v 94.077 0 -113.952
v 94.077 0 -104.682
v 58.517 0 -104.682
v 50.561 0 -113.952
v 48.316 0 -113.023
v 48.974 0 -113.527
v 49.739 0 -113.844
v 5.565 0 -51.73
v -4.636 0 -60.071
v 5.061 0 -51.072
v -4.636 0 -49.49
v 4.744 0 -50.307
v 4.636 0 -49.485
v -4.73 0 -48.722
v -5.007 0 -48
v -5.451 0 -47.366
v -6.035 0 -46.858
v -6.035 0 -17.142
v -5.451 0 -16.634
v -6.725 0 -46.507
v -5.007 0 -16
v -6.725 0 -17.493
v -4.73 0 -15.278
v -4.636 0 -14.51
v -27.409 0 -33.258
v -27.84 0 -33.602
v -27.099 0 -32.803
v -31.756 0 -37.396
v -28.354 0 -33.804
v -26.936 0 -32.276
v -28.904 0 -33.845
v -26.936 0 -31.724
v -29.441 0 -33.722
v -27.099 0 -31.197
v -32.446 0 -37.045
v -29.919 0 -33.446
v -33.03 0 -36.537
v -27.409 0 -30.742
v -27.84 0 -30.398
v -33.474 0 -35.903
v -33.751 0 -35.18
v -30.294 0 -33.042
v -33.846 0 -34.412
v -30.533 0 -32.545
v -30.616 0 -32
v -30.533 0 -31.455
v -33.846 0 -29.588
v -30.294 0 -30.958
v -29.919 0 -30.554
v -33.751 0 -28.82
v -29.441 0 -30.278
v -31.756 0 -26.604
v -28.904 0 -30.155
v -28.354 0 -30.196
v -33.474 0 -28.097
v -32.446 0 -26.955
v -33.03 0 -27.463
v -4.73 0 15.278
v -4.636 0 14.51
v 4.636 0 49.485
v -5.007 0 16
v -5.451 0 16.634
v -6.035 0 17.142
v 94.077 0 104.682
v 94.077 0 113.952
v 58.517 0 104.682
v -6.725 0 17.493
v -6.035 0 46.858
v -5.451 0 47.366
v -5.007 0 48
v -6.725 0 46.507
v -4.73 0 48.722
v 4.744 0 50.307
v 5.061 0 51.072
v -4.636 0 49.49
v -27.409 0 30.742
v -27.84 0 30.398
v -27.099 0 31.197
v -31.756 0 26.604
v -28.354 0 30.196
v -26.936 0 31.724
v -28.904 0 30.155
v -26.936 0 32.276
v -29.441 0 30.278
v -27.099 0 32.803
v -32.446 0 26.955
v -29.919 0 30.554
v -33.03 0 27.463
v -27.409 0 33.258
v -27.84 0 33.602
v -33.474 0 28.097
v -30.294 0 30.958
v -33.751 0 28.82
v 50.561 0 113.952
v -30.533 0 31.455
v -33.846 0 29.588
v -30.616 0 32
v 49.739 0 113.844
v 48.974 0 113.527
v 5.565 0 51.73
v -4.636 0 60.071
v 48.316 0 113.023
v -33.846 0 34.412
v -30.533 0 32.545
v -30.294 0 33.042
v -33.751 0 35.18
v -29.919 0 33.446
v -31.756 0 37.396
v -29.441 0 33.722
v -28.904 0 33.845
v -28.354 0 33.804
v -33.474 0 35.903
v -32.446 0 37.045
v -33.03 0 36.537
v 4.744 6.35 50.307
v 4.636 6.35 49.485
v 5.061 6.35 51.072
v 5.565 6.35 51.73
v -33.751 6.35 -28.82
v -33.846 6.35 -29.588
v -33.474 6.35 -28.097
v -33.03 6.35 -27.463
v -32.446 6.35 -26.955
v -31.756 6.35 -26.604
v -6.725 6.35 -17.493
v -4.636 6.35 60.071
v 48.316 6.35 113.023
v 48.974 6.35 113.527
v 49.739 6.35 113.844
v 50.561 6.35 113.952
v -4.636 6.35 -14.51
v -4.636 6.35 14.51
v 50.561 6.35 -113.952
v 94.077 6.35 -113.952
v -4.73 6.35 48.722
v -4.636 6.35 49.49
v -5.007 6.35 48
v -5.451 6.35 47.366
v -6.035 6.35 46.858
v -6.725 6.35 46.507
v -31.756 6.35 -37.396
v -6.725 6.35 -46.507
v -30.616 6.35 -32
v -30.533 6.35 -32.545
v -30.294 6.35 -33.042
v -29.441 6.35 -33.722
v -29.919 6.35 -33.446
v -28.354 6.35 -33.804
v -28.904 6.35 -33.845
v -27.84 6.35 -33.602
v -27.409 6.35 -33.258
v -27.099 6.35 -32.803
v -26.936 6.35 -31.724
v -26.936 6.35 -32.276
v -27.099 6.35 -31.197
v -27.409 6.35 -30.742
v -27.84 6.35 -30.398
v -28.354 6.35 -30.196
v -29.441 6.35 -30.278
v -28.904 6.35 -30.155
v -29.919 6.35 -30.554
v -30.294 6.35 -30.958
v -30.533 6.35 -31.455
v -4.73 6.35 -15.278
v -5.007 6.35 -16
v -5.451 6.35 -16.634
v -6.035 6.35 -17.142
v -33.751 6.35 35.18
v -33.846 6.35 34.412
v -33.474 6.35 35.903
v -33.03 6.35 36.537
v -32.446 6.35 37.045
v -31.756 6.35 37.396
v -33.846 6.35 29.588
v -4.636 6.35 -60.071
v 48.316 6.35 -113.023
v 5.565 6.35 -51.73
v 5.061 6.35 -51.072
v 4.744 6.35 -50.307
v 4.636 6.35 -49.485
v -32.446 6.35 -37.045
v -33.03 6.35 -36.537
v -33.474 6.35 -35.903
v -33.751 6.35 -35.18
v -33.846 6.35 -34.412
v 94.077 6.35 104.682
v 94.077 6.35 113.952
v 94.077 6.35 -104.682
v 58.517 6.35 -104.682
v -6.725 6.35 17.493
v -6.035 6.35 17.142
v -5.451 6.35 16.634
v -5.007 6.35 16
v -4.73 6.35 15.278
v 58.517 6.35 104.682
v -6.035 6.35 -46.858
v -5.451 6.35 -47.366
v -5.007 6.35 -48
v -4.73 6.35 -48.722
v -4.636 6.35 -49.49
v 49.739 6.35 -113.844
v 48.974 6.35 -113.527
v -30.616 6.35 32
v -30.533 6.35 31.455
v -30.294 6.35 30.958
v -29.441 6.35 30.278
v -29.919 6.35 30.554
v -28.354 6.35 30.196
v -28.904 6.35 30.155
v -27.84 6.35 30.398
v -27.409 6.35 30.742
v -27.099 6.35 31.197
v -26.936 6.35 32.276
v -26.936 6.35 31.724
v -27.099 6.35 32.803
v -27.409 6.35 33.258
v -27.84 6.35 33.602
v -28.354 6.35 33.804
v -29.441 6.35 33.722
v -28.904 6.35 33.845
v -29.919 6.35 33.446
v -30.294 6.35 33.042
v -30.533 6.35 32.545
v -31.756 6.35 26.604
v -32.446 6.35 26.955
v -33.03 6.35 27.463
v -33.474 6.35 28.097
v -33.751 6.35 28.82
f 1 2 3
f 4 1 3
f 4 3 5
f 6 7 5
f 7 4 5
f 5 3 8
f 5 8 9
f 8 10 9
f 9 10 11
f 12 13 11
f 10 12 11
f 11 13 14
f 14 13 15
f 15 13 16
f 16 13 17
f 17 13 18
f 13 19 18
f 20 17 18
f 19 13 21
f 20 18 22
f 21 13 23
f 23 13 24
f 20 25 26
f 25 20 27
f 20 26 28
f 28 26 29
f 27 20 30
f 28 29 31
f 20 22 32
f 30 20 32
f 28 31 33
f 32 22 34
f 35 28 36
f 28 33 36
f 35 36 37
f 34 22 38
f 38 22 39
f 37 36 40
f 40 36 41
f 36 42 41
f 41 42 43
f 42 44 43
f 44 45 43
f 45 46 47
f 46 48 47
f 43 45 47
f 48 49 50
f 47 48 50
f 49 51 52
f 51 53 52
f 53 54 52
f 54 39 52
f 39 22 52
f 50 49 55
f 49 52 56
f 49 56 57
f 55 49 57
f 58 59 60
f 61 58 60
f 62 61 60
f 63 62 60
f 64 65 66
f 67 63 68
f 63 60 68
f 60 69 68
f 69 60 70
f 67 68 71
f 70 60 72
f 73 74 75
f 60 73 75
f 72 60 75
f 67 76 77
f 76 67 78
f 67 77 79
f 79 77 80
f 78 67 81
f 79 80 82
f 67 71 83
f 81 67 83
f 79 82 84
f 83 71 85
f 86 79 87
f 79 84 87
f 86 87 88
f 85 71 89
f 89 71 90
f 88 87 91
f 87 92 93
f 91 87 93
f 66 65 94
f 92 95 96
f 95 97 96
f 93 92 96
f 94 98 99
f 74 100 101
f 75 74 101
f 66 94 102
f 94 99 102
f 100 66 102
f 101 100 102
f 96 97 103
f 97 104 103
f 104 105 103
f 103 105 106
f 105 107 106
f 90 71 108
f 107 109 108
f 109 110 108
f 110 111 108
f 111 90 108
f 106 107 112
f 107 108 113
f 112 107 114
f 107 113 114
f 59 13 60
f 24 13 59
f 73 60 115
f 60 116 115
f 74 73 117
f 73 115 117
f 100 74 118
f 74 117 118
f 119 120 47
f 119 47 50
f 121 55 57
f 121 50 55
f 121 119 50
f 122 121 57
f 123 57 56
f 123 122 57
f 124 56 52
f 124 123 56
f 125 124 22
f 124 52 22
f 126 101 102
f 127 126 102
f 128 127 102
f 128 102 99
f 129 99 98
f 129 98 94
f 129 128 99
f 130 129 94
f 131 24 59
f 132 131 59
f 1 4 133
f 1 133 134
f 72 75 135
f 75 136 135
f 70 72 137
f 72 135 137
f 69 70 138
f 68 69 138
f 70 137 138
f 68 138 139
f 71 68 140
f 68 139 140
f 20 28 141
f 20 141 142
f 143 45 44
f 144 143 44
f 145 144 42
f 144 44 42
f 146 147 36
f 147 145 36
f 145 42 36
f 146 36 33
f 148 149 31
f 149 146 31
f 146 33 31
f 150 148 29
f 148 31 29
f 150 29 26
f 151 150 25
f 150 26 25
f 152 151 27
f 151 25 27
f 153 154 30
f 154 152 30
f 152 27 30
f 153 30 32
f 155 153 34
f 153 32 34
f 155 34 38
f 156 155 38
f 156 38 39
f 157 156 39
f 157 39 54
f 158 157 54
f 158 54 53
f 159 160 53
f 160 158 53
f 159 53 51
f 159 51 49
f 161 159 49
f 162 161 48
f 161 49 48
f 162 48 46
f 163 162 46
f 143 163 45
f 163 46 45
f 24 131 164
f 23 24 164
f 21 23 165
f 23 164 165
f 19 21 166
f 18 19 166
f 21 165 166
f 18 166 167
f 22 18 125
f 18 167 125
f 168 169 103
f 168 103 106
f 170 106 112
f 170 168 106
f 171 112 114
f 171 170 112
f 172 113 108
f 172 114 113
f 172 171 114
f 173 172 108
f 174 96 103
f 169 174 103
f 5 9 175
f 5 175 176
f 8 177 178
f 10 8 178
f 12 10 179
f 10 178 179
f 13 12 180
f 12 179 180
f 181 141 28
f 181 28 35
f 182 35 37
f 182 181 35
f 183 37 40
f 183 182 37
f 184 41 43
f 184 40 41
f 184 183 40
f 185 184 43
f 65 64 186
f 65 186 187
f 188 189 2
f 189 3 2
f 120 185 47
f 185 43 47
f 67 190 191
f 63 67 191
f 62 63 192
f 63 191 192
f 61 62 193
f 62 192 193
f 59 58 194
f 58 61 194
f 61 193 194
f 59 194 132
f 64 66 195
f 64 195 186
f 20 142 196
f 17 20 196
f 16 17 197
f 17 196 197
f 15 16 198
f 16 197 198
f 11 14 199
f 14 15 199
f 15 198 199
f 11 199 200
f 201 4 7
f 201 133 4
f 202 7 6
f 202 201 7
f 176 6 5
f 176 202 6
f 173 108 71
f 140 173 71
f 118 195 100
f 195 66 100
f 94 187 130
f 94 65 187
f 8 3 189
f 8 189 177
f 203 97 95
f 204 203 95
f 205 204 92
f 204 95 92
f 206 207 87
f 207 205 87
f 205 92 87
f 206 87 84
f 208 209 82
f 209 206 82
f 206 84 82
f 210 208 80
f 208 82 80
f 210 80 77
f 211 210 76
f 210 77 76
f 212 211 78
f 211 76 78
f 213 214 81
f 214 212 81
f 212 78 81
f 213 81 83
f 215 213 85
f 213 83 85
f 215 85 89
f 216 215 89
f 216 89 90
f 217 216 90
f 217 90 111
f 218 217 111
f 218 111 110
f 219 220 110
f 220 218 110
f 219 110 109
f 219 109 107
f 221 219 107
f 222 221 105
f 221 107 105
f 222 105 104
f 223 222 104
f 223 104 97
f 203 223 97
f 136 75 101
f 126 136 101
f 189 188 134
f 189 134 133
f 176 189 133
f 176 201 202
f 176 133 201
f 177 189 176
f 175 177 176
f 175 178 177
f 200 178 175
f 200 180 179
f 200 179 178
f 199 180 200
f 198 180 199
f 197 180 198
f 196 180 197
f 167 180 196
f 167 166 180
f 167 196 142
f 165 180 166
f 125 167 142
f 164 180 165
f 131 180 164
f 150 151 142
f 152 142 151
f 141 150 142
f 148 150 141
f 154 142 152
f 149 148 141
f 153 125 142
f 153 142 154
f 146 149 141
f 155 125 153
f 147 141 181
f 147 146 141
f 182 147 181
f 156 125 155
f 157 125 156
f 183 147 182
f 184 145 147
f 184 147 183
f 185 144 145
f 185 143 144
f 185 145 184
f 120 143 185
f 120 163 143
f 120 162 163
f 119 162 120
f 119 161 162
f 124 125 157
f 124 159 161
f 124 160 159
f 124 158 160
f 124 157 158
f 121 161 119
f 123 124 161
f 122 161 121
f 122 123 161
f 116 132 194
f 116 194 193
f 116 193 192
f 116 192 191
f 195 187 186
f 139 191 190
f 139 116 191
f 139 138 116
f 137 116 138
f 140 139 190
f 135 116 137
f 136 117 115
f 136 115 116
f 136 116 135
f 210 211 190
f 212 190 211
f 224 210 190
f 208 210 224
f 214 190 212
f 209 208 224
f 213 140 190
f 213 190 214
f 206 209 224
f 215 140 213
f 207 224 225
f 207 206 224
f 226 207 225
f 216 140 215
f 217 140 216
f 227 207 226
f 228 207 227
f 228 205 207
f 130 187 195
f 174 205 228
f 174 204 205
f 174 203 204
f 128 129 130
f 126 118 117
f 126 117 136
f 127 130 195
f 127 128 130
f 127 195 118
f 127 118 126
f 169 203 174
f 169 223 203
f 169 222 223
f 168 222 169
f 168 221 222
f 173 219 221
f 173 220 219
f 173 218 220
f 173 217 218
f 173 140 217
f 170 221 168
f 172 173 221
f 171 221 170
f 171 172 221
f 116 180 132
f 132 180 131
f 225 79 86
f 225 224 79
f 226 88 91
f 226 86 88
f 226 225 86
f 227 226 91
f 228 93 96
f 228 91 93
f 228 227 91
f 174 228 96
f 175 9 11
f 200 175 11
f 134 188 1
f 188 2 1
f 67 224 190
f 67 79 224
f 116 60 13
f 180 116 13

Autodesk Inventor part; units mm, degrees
ref_plane "YZ Plane" through (0, 0, 0) normal (1, 0, 0) x (0, 1, 0)
ref_plane "XZ Plane" through (0, 0, 0) normal (0, 1, 0) x (-1, 0, 0)
ref_plane "XY Plane" through (0, 0, 0) normal (0, 0, 1) x (1, 0, 0)
sketch "Sketch1" plane through (0, 0, 0) normal (0, 1, 0) x (-1, 0, 0)
  line L0 (4.6355, 50.8) -> (-4.6355, 50.8)
  line L1 (-4.6355, 50.8) -> (-4.6355, -50.8)
  line L2 (-4.6355, -50.8) -> (4.6355, -50.8)
  line L3 (4.6355, -50.8) -> (4.6355, 50.8)
  line L4 (4.6355, 50.8) -> (-4.6355, -50.8) construction
  line L5 (-4.6355, 50.8) -> (4.6355, -50.8) construction
  line L6 (4.6355, 50.8) -> (4.6355, 75.7051) construction
  line L7 (4.6355, -50.8) -> (4.6355, -91.0918) construction
  line L8 (-4.6355, 50.8) -> (4.6355, 60.071)
  line L9 (4.6355, 60.071) -> (-49.246, 113.9525)
  line L10 (-49.246, 113.9525) -> (-58.517, 104.6815)
  line L11 (-58.517, 104.6815) -> (-4.6355, 50.8)
  line L12 (-4.6355, 50.8) -> (8.4757, 50.8) construction
  line L13 (-4.6355, -50.8) -> (4.6355, -60.071)
  line L14 (4.6355, -60.071) -> (-49.246, -113.9525)
  line L15 (-49.246, -113.9525) -> (-58.517, -104.6815)
  line L16 (-58.517, -104.6815) -> (-4.6355, -50.8)
  line L17 (-4.6355, -50.8) -> (8.4757, -50.8) construction
  line L18 (4.6355, 60.071) -> (4.6355, 50.8)
  line L19 (4.6355, -50.8) -> (4.6355, -60.071)
  line L20 (4.6355, 50.8) -> (4.6355, 38.1)
  line L21 (4.6355, 41.021) -> (4.6355, 60.071)
  line L22 (4.6355, 31.75) -> (4.6355, 41.021)
  line L23 (48.5075, 0) -> (-17.0034, 0) construction
  line L24 (-58.517, -104.6815) -> (-58.517, 104.6815) construction
  line L25 (-49.246, -113.9525) -> (-58.517, -113.9525)
  line L26 (-58.517, -113.9525) -> (-58.517, -104.6815)
  line L27 (-58.517, -104.6815) -> (-94.077, -104.6815)
  line L28 (-94.077, -104.6815) -> (-94.077, -113.9525)
  line L29 (-94.077, -113.9525) -> (-58.517, -113.9525)
  line L30 (-58.517, 104.6815) -> (-94.077, 104.6815)
  line L31 (-94.077, 104.6815) -> (-94.077, 113.9525)
  line L32 (-94.077, 113.9525) -> (-49.246, 113.9525)
  line L33 (55.1879, -32) -> (4.6355, -32) construction
  line L34 (4.6355, -32) -> (4.6355, -60.071)
  line L35 (4.6355, 22.7291) -> (4.6355, 50.8)
  line L36 (33.8455, 32) -> (4.6355, 32) construction
  line L37 (4.6355, 32) -> (4.6355, 60.071)
  line L38 (4.6355, 27.3645) -> (33.8455, 27.3645) construction
  line L39 (33.8455, 27.3645) -> (33.8455, 36.6355)
  line L40 (33.8455, 36.6355) -> (4.6355, 36.6355) construction
  line L41 (4.6355, 36.6355) -> (4.6355, 27.3645)
  line L42 (4.6355, 27.3645) -> (33.8455, 36.6355) construction
  line L43 (33.8455, 27.3645) -> (4.6355, 36.6355) construction
  line L44 (4.6355, -32) -> (33.8455, -32) construction
  line L45 (4.6355, -36.6355) -> (33.8455, -36.6355) construction
  line L46 (33.8455, -36.6355) -> (33.8455, -27.3645)
  line L47 (33.8455, -27.3645) -> (4.6355, -27.3645) construction
  line L48 (4.6355, -27.3645) -> (4.6355, -36.6355)
  line L49 (4.6355, -36.6355) -> (33.8455, -27.3645) construction
  line L50 (33.8455, -36.6355) -> (4.6355, -27.3645) construction
  line L51 (33.8455, -32) -> (28.7655, -32) construction
  circle A0 centre (28.7655, -32) radius 1.85
  line L52 (33.8455, 32) -> (28.7655, 32) construction
  circle A1 centre (28.7655, 32) radius 1.85
  line L53 (33.8455, -36.6355) -> (4.6355, -47.2671)
  line L54 (33.8455, -36.6355) -> (64.9301, -36.6355) construction
  line L55 (33.8455, -27.3645) -> (4.6355, -16.7329)
  line L56 (33.8455, -27.3645) -> (64.9301, -27.3645) construction
  line L57 (33.8455, 27.3645) -> (4.6355, 16.7329)
  line L58 (33.8455, 27.3645) -> (64.9301, 27.3645) construction
  line L59 (33.8455, 36.6355) -> (4.6355, 47.2671)
  line L60 (33.8455, 36.6355) -> (64.9301, 36.6355) construction
  point P0 (0, 0)
  point P1 (33.8455, 45.6585)
  point P2 (33.8455, 45.6585)
  point P3 (33.8455, 45.6585)
  dimension "d0" = 9.271
  dimension "d1" = 101.6
  dimension "d2" = 45
  dimension "d3" = 76.2
  dimension "d4" = 45
  dimension "d5" = 76.2
  dimension "d8" = 12.7
  dimension "d12" = 35.56
  dimension "d17" = 35.56
  dimension "d28" = 9.271
  dimension "d29" = 50.5524
  dimension "d30" = 29.21
  dimension "d31" = 9.271
  dimension "d32" = 5.08
  dimension "d33" = 3.7
  dimension "d34" = 5.08
  dimension "d35" = 3.7
  dimension "d36" = 160
  dimension "d37" = 160
  dimension "d38" = 160
  dimension "d39" = 160
extrude "Extrusion4" add sketch "Sketch1" along normal blind 6.35
fillet "Fillet4" radius 3.175 6 edges at (49.246, 3.175, 113.9525) (49.246, 3.175, -113.9525) (-4.6355, 3.175, -47.2671) (-4.6355, 3.175, 16.7329) (-4.6355, 3.175, 47.2671) (-4.6355, 3.175, -16.7329)
fillet "Fillet5" radius 3.175 4 edges at (-33.8455, 3.175, 36.6355) (-33.8455, 3.175, -27.3645) (-33.8455, 3.175, 27.3645) (-33.8455, 3.175, -36.6355)
fillet "Fillet6" radius 3.175 2 edges at (4.6355, 3.175, 50.8) (4.6355, 3.175, -50.8)
properties part number "Arm"
